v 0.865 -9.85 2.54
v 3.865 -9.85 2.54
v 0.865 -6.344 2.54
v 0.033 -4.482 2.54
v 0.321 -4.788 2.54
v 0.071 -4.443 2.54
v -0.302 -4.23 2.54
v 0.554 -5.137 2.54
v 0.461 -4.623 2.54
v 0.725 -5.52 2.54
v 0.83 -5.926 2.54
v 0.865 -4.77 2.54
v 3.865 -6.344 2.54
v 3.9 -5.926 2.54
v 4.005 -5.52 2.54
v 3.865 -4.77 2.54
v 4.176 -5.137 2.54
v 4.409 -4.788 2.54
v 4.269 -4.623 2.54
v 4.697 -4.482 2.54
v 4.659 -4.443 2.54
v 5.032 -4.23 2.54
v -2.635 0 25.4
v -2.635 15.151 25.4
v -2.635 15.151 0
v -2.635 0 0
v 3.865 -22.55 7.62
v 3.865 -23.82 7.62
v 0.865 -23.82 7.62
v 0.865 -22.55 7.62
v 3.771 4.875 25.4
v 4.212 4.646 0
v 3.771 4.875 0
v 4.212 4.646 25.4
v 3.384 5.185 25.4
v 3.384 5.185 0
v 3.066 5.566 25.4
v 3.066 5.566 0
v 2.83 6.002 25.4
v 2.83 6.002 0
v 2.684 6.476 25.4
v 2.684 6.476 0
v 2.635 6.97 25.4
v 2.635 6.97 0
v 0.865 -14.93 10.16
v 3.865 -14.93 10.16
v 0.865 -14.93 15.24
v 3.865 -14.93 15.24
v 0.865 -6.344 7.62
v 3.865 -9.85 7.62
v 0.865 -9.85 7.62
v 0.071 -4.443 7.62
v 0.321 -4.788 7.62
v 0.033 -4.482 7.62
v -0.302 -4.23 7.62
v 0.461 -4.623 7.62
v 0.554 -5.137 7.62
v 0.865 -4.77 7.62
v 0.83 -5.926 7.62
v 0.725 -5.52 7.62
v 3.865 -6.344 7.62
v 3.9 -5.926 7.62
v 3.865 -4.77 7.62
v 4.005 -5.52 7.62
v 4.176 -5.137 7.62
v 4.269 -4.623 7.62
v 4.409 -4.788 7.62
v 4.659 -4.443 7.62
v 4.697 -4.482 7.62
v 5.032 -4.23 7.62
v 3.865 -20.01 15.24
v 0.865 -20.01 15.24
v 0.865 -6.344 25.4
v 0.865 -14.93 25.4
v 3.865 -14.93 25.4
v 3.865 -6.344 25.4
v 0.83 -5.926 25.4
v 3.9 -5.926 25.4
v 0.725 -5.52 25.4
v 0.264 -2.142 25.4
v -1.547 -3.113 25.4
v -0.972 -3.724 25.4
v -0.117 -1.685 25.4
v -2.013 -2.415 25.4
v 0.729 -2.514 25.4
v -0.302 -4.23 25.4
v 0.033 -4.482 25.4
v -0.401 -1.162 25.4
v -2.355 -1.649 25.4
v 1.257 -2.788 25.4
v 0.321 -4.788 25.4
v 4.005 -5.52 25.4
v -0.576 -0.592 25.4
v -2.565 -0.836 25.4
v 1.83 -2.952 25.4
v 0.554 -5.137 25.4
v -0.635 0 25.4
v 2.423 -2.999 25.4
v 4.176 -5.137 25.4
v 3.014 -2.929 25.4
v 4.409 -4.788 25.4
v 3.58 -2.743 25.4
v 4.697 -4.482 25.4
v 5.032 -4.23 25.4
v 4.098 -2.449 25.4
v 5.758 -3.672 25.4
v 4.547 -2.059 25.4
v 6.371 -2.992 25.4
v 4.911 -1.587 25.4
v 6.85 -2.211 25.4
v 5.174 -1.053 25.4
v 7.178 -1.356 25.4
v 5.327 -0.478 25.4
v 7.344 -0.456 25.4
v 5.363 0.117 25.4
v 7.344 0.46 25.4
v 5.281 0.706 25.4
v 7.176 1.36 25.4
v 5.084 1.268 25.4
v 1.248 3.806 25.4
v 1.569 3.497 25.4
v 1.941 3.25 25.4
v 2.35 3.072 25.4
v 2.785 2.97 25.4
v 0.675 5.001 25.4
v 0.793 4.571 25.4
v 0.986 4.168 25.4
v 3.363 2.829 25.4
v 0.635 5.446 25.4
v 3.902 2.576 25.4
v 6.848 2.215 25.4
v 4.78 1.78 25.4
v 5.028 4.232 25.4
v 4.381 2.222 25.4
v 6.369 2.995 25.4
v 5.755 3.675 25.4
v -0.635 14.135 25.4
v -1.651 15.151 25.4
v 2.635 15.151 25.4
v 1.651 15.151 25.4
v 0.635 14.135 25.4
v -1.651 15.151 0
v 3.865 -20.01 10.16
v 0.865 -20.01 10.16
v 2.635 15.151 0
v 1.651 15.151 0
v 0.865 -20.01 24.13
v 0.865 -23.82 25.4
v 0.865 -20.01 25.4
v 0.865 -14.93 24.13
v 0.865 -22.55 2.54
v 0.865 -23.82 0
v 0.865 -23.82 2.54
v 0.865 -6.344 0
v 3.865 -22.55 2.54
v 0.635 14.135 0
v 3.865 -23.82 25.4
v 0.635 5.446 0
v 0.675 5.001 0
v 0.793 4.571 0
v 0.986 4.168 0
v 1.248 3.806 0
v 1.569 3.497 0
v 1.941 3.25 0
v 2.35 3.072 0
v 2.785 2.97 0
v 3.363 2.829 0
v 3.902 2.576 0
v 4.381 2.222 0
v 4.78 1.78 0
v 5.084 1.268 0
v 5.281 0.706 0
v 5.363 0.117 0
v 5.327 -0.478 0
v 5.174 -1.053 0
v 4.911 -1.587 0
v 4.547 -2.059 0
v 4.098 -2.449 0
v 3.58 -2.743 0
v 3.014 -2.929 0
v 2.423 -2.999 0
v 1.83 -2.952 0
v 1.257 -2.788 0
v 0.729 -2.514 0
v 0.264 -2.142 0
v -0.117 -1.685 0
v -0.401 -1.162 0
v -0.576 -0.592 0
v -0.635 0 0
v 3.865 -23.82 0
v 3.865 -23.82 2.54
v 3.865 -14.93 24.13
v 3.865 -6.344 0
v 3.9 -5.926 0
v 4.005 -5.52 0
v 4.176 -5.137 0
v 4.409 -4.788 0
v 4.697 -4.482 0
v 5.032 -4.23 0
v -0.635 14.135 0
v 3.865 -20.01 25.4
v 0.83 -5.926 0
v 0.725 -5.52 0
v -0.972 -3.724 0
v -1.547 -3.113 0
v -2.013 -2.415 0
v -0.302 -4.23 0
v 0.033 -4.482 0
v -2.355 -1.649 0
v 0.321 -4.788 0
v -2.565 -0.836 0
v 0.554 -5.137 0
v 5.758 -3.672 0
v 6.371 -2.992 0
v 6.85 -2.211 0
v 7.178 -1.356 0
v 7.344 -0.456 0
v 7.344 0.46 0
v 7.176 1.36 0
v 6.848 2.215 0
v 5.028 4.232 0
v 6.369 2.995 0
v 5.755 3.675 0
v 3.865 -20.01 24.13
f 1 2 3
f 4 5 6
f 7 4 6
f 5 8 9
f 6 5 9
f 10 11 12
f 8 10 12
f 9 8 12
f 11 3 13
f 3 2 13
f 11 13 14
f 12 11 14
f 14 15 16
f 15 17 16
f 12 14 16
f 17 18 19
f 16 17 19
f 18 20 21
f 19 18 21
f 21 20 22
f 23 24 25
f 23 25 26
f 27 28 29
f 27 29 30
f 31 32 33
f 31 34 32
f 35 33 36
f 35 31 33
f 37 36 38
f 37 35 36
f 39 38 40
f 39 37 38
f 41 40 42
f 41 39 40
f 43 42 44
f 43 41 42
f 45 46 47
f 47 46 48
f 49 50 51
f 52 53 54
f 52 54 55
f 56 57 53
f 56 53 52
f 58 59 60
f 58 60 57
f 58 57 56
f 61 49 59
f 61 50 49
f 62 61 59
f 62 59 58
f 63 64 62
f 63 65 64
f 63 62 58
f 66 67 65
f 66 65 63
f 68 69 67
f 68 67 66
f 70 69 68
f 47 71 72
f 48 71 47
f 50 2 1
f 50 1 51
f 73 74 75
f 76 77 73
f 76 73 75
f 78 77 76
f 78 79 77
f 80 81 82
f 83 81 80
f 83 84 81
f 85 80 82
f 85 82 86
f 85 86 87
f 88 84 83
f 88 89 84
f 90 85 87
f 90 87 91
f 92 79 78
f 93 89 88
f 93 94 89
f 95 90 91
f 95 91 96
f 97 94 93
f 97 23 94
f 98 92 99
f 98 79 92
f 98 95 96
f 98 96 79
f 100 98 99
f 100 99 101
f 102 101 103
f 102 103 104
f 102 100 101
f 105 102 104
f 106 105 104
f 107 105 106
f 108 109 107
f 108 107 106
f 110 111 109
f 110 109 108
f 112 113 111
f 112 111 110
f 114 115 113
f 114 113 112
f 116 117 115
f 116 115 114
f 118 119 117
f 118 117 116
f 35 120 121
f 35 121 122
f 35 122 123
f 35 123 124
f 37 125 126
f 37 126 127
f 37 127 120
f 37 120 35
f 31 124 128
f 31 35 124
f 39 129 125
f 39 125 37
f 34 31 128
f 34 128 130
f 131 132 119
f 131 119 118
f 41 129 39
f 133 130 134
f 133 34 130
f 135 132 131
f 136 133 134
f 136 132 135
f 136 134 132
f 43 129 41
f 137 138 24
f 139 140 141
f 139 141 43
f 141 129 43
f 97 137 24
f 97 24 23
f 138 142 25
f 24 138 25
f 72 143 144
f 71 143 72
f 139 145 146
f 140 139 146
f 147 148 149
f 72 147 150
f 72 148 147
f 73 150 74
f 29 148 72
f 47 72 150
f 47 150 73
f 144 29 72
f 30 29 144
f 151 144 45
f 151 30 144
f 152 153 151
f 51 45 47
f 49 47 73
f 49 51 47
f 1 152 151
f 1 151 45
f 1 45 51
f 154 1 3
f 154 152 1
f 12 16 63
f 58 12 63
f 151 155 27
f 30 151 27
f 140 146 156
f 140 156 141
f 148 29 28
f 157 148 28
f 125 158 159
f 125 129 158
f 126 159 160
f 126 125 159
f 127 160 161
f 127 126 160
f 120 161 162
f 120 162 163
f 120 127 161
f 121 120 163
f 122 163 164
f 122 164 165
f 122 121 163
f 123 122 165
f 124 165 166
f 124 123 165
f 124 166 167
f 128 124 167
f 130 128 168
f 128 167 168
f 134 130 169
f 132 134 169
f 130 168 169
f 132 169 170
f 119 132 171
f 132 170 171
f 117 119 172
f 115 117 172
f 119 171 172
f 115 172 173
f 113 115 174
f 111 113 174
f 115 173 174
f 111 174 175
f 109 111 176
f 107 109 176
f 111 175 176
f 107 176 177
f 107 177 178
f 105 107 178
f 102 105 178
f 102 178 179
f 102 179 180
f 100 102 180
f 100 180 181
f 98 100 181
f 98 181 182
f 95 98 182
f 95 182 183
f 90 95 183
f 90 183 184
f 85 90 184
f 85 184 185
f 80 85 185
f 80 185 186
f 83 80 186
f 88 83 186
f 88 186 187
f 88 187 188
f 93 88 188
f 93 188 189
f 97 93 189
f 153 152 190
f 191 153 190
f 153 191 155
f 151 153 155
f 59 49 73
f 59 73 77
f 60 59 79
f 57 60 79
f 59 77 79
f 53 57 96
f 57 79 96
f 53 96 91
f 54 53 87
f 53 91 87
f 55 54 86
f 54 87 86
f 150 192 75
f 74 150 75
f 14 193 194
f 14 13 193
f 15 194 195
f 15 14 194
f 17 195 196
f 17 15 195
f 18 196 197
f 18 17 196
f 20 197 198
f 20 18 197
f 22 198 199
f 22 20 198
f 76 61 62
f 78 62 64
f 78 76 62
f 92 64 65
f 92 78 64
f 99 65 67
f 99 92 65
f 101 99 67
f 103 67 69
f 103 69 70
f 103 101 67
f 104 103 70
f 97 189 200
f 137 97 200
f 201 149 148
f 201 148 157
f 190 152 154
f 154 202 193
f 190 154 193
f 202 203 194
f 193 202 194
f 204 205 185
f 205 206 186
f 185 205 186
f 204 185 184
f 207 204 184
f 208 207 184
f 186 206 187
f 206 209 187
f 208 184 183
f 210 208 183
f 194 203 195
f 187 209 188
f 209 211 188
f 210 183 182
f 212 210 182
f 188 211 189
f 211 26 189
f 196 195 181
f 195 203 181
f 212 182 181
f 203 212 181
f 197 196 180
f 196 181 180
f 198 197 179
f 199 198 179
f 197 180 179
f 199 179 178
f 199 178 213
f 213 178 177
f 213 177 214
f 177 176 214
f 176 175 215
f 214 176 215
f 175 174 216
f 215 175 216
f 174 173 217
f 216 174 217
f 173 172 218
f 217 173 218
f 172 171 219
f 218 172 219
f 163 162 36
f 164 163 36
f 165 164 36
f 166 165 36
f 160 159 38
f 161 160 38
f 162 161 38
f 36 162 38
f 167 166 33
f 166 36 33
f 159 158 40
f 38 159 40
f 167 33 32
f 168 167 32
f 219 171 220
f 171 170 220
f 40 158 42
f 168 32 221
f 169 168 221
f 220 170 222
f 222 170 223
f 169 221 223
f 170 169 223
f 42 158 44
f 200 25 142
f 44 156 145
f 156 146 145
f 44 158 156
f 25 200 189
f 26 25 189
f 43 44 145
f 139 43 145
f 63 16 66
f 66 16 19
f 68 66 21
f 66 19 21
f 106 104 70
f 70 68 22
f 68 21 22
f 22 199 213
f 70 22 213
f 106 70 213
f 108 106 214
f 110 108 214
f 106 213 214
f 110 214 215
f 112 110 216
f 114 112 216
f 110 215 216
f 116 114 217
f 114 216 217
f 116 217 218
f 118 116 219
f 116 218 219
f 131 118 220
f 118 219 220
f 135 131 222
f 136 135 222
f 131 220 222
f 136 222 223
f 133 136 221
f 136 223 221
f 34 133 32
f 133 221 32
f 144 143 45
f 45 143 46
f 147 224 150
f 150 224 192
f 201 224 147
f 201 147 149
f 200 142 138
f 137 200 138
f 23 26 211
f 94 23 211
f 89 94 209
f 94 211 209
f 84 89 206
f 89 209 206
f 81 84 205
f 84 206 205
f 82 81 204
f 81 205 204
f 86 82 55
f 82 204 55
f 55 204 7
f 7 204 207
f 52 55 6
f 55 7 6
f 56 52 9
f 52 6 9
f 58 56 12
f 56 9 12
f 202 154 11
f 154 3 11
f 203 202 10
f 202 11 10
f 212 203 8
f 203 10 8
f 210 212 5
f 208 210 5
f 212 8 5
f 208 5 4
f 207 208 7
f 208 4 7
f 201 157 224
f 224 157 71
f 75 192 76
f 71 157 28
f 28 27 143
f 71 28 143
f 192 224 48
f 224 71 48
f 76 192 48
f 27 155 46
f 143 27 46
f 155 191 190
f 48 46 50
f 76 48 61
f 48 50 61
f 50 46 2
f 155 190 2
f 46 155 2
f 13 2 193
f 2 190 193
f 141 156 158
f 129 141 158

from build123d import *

# Parameters (mm, degrees)
F1_DEPTH = 25.4
F2_SIZE  = 1.016
F3_W     = 3
F3_H     = 19.05
F4_DEPTH = 25.4
F5_W     = 5.08
F5_H     = 5.08
F5_W_2   = 1.27
F5_H_2   = 1.27
F6_DEPTH = 6.501
F7_R     = 2.5


with BuildPart() as f1:
    # F0 (on Top) → F1 (new body)
    with BuildSketch(Plane.XY):
        with BuildLine():
            Line((0.635, 15.1509385957), (0.635, 2.4509385957))
            ThreePointArc((0.635, 2.4509385957), (5.0286441204, -1.3802173742), (-0.635, 0))
            Line((-0.635, 0), (-0.635, 15.1509385957))
            Line((-0.635, 15.1509385957), (-2.635, 15.1509385957))
            Line((-2.635, 15.1509385957), (-2.635, 0))
            ThreePointArc((-2.635, 0), (5.8037497728, -3.6297382826), (2.635, 4.9927046778))
            Line((2.635, 4.9927046778), (2.635, 15.1509385957))
            Line((2.635, 15.1509385957), (0.635, 15.1509385957))
        make_face()
    extrude(amount=F1_DEPTH)

    # F2
    f2_edges = [f1.edges().sort_by_distance(p)[0] for p in [
        (-0.635, 15.150939, 12.7),
        (0.635, 15.150939, 12.7),
    ]]
    chamfer(f2_edges, length=F2_SIZE)

    # F3 (on Top) → F4 (join, through all)
    with BuildSketch(Plane.XY):
        with Locations((2.365, -14.2946960071)):
            Rectangle(F3_W, F3_H)
    extrude(amount=F4_DEPTH)

    # F5 (on face) → F6 (cut, through all)
    with BuildSketch(Plane.YZ.offset(3.865)):
        with Locations((-7.3096960071, 5.08)):
            Rectangle(F5_W, F5_H)
        with Locations((-17.4696960071, 12.7)):
            Rectangle(F5_W, F5_H)
        with Locations((-23.1846960071, 5.08)):
            Rectangle(F5_W_2, F5_H)
        with Locations((-17.4696960071, 24.765)):
            Rectangle(F5_W, F5_H_2)
    extrude(amount=-F6_DEPTH, mode=Mode.SUBTRACT)

    # F7
    f7_edges = [f1.edges().sort_by_distance(p)[0] for p in [
        (0.635, 2.450939, 12.7),
        (-2.635, 0, 12.7),
        (2.635, 4.992705, 12.7),
        (3.865, -4.769696, 16.51),
        (0.865, -4.769696, 16.51),
        (0.865, -4.769696, 1.27),
        (3.865, -4.769696, 1.27),
    ]]
    fillet(f7_edges, radius=F7_R)


solid = f1.part
